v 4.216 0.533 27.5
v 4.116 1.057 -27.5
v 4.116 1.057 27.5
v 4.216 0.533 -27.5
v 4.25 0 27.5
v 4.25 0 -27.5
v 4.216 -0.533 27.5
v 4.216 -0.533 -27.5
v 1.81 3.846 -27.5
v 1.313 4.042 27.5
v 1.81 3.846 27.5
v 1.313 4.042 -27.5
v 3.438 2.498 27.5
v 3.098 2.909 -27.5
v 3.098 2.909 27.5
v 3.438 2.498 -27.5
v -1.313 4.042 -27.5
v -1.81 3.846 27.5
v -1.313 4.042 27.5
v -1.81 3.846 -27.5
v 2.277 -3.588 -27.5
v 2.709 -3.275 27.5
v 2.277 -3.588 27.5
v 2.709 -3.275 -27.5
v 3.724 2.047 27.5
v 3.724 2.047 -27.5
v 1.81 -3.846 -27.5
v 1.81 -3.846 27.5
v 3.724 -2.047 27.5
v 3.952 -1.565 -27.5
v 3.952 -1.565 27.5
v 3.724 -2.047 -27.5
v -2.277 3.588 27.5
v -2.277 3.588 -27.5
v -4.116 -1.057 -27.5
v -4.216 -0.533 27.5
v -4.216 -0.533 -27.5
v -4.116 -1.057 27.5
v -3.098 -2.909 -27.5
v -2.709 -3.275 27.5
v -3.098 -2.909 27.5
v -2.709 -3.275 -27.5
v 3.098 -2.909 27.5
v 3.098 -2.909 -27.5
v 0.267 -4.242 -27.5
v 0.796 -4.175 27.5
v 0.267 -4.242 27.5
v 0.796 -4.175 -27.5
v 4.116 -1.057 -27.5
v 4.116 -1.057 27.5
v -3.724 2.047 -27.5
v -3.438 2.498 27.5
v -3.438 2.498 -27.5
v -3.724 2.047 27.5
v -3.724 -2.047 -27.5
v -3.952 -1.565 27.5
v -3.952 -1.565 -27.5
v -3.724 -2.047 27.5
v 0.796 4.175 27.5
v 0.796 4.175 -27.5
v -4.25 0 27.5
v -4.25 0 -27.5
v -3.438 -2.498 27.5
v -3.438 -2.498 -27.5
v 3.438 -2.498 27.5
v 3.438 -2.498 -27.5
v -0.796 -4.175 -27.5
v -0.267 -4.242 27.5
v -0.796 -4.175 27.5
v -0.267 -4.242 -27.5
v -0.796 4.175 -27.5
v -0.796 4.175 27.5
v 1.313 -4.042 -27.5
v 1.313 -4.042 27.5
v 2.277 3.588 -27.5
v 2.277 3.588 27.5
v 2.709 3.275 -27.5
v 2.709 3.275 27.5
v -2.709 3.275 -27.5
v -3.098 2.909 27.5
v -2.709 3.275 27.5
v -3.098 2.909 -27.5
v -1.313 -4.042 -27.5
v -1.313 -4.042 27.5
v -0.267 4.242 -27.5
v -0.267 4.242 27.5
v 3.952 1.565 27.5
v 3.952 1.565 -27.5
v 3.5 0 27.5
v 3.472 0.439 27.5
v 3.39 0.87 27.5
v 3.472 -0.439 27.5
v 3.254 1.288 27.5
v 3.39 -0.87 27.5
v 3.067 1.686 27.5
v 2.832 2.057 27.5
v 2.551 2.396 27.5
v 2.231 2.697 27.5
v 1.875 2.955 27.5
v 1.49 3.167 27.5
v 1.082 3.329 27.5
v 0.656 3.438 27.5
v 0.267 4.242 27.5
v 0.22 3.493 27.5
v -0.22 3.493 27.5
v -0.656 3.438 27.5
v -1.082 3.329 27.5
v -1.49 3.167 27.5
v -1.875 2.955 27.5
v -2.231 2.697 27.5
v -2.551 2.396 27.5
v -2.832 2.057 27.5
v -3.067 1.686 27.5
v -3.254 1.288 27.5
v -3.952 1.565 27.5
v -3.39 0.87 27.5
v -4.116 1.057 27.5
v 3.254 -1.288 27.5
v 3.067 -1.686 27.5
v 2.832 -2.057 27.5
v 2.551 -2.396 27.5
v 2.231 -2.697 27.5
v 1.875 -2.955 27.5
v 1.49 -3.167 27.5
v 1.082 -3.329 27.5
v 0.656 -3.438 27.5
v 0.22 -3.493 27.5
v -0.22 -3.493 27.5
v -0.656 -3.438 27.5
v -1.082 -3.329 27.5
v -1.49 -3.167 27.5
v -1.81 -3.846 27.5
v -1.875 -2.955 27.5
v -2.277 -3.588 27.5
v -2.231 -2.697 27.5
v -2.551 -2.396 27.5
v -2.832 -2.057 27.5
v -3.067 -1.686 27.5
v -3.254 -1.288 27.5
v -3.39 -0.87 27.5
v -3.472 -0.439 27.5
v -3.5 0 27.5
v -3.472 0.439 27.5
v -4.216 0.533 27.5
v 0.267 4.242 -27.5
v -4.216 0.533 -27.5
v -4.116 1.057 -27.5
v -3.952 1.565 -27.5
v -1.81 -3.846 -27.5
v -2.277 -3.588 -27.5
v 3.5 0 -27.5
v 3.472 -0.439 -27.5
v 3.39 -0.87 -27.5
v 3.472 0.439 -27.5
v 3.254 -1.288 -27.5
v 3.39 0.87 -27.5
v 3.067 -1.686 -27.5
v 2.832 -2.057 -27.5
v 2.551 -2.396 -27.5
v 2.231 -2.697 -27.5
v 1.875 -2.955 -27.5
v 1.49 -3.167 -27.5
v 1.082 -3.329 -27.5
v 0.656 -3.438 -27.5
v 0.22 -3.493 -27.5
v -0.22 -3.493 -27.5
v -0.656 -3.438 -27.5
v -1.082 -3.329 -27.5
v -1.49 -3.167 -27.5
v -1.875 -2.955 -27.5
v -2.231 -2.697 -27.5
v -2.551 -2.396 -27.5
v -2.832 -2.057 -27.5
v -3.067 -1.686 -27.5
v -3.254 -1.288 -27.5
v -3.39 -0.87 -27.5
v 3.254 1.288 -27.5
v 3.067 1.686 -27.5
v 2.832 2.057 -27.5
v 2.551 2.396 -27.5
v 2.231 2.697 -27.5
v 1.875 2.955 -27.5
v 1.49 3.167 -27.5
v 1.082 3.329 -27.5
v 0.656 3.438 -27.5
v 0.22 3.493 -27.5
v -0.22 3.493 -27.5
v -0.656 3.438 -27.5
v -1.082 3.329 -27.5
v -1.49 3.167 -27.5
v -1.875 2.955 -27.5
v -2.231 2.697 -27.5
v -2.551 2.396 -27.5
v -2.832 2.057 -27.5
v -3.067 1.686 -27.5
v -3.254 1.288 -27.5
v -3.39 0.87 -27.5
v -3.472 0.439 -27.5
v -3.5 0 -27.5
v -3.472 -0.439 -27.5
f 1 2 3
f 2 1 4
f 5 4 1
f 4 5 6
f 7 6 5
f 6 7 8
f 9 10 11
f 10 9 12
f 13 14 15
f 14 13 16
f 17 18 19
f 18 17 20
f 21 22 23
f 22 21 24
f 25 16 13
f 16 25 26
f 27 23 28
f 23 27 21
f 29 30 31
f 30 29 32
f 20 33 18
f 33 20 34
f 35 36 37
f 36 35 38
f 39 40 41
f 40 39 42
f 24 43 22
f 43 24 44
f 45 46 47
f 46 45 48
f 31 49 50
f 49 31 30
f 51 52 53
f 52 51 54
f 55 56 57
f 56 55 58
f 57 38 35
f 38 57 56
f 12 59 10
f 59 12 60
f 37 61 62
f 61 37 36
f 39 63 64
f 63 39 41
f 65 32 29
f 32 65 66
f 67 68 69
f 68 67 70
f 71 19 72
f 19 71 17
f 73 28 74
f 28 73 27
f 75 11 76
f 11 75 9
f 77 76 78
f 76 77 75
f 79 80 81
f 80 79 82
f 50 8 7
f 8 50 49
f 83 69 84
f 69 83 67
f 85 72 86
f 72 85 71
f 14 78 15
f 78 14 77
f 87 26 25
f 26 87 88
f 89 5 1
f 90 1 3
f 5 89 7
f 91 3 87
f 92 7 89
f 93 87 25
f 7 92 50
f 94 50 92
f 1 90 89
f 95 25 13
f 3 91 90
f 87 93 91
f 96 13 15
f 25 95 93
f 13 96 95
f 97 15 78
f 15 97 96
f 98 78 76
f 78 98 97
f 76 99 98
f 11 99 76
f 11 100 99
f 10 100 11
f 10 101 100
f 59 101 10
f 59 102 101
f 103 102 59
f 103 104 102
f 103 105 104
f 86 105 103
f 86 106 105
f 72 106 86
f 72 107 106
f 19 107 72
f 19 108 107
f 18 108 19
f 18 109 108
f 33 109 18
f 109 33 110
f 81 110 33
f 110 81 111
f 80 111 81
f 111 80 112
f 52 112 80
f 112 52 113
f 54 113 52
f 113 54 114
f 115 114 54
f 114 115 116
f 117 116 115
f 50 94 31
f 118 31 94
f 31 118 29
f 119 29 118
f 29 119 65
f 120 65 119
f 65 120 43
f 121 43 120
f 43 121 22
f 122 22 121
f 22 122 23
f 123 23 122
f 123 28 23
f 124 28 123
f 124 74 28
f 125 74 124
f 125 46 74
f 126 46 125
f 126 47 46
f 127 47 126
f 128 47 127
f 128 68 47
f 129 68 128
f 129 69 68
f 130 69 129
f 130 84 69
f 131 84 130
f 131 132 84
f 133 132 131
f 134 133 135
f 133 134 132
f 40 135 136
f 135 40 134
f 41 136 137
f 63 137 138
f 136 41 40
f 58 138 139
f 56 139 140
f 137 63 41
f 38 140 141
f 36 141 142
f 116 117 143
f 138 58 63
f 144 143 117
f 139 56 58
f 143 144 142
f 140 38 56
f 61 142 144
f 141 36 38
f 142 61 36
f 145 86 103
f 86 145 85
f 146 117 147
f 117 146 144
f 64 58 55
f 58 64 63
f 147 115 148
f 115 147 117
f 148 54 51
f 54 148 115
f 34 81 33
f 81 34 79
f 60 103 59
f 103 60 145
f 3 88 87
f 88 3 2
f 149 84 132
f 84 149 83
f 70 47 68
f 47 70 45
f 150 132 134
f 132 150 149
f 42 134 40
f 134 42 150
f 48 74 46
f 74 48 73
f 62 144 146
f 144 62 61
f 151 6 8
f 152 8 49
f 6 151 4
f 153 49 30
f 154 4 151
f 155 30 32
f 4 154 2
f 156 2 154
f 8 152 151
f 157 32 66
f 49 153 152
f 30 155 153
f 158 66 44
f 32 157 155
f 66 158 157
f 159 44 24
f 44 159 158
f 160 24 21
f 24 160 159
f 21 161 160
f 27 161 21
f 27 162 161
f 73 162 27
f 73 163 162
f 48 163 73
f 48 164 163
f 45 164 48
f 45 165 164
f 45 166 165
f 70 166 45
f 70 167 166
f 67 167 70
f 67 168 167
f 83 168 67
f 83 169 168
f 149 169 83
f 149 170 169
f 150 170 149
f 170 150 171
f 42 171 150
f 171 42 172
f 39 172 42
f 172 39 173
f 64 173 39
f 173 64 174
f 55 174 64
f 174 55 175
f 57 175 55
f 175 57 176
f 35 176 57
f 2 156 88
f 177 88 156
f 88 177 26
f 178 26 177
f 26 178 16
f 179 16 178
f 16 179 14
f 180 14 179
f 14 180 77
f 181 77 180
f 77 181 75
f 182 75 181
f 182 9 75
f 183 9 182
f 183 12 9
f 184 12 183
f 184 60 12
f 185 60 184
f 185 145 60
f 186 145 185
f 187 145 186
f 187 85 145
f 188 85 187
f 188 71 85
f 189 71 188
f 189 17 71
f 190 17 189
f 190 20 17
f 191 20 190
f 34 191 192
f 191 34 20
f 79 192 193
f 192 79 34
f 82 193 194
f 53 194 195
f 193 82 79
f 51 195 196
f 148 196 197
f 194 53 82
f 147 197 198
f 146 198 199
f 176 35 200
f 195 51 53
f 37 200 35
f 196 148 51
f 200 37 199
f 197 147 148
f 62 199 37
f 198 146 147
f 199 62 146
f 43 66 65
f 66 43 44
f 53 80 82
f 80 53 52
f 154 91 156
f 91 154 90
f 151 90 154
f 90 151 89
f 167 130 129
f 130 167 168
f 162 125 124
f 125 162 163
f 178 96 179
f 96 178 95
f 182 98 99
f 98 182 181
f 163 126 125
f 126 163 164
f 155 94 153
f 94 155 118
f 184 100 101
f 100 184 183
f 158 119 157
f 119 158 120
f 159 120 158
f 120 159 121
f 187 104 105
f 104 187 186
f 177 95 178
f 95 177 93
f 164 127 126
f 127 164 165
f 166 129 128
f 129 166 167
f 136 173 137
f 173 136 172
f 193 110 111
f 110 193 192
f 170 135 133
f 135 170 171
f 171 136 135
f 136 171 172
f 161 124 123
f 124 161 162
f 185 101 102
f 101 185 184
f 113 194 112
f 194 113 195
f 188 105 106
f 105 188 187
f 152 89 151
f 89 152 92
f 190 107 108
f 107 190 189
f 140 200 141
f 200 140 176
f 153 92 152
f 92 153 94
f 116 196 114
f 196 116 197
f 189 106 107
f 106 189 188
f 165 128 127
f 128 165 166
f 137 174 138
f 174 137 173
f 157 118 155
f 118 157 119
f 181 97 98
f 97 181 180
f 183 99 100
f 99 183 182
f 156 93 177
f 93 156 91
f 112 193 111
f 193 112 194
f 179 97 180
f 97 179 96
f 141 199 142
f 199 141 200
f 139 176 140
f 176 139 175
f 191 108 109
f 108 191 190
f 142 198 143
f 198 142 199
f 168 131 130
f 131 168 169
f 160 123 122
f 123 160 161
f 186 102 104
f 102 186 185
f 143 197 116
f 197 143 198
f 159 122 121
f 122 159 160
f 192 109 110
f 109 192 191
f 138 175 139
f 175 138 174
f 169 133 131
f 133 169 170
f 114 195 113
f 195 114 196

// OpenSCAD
$fn = 50;


difference() {
	union() {
		translate(v = [0, 0, -27.5000000000]) {
			cylinder(h = 55, r = 4.2500000000);
		}
	}
	union() {
		translate(v = [0, 0, -100.0000000000]) {
			cylinder(h = 200, r = 3.5000000000);
		}
	}
}
